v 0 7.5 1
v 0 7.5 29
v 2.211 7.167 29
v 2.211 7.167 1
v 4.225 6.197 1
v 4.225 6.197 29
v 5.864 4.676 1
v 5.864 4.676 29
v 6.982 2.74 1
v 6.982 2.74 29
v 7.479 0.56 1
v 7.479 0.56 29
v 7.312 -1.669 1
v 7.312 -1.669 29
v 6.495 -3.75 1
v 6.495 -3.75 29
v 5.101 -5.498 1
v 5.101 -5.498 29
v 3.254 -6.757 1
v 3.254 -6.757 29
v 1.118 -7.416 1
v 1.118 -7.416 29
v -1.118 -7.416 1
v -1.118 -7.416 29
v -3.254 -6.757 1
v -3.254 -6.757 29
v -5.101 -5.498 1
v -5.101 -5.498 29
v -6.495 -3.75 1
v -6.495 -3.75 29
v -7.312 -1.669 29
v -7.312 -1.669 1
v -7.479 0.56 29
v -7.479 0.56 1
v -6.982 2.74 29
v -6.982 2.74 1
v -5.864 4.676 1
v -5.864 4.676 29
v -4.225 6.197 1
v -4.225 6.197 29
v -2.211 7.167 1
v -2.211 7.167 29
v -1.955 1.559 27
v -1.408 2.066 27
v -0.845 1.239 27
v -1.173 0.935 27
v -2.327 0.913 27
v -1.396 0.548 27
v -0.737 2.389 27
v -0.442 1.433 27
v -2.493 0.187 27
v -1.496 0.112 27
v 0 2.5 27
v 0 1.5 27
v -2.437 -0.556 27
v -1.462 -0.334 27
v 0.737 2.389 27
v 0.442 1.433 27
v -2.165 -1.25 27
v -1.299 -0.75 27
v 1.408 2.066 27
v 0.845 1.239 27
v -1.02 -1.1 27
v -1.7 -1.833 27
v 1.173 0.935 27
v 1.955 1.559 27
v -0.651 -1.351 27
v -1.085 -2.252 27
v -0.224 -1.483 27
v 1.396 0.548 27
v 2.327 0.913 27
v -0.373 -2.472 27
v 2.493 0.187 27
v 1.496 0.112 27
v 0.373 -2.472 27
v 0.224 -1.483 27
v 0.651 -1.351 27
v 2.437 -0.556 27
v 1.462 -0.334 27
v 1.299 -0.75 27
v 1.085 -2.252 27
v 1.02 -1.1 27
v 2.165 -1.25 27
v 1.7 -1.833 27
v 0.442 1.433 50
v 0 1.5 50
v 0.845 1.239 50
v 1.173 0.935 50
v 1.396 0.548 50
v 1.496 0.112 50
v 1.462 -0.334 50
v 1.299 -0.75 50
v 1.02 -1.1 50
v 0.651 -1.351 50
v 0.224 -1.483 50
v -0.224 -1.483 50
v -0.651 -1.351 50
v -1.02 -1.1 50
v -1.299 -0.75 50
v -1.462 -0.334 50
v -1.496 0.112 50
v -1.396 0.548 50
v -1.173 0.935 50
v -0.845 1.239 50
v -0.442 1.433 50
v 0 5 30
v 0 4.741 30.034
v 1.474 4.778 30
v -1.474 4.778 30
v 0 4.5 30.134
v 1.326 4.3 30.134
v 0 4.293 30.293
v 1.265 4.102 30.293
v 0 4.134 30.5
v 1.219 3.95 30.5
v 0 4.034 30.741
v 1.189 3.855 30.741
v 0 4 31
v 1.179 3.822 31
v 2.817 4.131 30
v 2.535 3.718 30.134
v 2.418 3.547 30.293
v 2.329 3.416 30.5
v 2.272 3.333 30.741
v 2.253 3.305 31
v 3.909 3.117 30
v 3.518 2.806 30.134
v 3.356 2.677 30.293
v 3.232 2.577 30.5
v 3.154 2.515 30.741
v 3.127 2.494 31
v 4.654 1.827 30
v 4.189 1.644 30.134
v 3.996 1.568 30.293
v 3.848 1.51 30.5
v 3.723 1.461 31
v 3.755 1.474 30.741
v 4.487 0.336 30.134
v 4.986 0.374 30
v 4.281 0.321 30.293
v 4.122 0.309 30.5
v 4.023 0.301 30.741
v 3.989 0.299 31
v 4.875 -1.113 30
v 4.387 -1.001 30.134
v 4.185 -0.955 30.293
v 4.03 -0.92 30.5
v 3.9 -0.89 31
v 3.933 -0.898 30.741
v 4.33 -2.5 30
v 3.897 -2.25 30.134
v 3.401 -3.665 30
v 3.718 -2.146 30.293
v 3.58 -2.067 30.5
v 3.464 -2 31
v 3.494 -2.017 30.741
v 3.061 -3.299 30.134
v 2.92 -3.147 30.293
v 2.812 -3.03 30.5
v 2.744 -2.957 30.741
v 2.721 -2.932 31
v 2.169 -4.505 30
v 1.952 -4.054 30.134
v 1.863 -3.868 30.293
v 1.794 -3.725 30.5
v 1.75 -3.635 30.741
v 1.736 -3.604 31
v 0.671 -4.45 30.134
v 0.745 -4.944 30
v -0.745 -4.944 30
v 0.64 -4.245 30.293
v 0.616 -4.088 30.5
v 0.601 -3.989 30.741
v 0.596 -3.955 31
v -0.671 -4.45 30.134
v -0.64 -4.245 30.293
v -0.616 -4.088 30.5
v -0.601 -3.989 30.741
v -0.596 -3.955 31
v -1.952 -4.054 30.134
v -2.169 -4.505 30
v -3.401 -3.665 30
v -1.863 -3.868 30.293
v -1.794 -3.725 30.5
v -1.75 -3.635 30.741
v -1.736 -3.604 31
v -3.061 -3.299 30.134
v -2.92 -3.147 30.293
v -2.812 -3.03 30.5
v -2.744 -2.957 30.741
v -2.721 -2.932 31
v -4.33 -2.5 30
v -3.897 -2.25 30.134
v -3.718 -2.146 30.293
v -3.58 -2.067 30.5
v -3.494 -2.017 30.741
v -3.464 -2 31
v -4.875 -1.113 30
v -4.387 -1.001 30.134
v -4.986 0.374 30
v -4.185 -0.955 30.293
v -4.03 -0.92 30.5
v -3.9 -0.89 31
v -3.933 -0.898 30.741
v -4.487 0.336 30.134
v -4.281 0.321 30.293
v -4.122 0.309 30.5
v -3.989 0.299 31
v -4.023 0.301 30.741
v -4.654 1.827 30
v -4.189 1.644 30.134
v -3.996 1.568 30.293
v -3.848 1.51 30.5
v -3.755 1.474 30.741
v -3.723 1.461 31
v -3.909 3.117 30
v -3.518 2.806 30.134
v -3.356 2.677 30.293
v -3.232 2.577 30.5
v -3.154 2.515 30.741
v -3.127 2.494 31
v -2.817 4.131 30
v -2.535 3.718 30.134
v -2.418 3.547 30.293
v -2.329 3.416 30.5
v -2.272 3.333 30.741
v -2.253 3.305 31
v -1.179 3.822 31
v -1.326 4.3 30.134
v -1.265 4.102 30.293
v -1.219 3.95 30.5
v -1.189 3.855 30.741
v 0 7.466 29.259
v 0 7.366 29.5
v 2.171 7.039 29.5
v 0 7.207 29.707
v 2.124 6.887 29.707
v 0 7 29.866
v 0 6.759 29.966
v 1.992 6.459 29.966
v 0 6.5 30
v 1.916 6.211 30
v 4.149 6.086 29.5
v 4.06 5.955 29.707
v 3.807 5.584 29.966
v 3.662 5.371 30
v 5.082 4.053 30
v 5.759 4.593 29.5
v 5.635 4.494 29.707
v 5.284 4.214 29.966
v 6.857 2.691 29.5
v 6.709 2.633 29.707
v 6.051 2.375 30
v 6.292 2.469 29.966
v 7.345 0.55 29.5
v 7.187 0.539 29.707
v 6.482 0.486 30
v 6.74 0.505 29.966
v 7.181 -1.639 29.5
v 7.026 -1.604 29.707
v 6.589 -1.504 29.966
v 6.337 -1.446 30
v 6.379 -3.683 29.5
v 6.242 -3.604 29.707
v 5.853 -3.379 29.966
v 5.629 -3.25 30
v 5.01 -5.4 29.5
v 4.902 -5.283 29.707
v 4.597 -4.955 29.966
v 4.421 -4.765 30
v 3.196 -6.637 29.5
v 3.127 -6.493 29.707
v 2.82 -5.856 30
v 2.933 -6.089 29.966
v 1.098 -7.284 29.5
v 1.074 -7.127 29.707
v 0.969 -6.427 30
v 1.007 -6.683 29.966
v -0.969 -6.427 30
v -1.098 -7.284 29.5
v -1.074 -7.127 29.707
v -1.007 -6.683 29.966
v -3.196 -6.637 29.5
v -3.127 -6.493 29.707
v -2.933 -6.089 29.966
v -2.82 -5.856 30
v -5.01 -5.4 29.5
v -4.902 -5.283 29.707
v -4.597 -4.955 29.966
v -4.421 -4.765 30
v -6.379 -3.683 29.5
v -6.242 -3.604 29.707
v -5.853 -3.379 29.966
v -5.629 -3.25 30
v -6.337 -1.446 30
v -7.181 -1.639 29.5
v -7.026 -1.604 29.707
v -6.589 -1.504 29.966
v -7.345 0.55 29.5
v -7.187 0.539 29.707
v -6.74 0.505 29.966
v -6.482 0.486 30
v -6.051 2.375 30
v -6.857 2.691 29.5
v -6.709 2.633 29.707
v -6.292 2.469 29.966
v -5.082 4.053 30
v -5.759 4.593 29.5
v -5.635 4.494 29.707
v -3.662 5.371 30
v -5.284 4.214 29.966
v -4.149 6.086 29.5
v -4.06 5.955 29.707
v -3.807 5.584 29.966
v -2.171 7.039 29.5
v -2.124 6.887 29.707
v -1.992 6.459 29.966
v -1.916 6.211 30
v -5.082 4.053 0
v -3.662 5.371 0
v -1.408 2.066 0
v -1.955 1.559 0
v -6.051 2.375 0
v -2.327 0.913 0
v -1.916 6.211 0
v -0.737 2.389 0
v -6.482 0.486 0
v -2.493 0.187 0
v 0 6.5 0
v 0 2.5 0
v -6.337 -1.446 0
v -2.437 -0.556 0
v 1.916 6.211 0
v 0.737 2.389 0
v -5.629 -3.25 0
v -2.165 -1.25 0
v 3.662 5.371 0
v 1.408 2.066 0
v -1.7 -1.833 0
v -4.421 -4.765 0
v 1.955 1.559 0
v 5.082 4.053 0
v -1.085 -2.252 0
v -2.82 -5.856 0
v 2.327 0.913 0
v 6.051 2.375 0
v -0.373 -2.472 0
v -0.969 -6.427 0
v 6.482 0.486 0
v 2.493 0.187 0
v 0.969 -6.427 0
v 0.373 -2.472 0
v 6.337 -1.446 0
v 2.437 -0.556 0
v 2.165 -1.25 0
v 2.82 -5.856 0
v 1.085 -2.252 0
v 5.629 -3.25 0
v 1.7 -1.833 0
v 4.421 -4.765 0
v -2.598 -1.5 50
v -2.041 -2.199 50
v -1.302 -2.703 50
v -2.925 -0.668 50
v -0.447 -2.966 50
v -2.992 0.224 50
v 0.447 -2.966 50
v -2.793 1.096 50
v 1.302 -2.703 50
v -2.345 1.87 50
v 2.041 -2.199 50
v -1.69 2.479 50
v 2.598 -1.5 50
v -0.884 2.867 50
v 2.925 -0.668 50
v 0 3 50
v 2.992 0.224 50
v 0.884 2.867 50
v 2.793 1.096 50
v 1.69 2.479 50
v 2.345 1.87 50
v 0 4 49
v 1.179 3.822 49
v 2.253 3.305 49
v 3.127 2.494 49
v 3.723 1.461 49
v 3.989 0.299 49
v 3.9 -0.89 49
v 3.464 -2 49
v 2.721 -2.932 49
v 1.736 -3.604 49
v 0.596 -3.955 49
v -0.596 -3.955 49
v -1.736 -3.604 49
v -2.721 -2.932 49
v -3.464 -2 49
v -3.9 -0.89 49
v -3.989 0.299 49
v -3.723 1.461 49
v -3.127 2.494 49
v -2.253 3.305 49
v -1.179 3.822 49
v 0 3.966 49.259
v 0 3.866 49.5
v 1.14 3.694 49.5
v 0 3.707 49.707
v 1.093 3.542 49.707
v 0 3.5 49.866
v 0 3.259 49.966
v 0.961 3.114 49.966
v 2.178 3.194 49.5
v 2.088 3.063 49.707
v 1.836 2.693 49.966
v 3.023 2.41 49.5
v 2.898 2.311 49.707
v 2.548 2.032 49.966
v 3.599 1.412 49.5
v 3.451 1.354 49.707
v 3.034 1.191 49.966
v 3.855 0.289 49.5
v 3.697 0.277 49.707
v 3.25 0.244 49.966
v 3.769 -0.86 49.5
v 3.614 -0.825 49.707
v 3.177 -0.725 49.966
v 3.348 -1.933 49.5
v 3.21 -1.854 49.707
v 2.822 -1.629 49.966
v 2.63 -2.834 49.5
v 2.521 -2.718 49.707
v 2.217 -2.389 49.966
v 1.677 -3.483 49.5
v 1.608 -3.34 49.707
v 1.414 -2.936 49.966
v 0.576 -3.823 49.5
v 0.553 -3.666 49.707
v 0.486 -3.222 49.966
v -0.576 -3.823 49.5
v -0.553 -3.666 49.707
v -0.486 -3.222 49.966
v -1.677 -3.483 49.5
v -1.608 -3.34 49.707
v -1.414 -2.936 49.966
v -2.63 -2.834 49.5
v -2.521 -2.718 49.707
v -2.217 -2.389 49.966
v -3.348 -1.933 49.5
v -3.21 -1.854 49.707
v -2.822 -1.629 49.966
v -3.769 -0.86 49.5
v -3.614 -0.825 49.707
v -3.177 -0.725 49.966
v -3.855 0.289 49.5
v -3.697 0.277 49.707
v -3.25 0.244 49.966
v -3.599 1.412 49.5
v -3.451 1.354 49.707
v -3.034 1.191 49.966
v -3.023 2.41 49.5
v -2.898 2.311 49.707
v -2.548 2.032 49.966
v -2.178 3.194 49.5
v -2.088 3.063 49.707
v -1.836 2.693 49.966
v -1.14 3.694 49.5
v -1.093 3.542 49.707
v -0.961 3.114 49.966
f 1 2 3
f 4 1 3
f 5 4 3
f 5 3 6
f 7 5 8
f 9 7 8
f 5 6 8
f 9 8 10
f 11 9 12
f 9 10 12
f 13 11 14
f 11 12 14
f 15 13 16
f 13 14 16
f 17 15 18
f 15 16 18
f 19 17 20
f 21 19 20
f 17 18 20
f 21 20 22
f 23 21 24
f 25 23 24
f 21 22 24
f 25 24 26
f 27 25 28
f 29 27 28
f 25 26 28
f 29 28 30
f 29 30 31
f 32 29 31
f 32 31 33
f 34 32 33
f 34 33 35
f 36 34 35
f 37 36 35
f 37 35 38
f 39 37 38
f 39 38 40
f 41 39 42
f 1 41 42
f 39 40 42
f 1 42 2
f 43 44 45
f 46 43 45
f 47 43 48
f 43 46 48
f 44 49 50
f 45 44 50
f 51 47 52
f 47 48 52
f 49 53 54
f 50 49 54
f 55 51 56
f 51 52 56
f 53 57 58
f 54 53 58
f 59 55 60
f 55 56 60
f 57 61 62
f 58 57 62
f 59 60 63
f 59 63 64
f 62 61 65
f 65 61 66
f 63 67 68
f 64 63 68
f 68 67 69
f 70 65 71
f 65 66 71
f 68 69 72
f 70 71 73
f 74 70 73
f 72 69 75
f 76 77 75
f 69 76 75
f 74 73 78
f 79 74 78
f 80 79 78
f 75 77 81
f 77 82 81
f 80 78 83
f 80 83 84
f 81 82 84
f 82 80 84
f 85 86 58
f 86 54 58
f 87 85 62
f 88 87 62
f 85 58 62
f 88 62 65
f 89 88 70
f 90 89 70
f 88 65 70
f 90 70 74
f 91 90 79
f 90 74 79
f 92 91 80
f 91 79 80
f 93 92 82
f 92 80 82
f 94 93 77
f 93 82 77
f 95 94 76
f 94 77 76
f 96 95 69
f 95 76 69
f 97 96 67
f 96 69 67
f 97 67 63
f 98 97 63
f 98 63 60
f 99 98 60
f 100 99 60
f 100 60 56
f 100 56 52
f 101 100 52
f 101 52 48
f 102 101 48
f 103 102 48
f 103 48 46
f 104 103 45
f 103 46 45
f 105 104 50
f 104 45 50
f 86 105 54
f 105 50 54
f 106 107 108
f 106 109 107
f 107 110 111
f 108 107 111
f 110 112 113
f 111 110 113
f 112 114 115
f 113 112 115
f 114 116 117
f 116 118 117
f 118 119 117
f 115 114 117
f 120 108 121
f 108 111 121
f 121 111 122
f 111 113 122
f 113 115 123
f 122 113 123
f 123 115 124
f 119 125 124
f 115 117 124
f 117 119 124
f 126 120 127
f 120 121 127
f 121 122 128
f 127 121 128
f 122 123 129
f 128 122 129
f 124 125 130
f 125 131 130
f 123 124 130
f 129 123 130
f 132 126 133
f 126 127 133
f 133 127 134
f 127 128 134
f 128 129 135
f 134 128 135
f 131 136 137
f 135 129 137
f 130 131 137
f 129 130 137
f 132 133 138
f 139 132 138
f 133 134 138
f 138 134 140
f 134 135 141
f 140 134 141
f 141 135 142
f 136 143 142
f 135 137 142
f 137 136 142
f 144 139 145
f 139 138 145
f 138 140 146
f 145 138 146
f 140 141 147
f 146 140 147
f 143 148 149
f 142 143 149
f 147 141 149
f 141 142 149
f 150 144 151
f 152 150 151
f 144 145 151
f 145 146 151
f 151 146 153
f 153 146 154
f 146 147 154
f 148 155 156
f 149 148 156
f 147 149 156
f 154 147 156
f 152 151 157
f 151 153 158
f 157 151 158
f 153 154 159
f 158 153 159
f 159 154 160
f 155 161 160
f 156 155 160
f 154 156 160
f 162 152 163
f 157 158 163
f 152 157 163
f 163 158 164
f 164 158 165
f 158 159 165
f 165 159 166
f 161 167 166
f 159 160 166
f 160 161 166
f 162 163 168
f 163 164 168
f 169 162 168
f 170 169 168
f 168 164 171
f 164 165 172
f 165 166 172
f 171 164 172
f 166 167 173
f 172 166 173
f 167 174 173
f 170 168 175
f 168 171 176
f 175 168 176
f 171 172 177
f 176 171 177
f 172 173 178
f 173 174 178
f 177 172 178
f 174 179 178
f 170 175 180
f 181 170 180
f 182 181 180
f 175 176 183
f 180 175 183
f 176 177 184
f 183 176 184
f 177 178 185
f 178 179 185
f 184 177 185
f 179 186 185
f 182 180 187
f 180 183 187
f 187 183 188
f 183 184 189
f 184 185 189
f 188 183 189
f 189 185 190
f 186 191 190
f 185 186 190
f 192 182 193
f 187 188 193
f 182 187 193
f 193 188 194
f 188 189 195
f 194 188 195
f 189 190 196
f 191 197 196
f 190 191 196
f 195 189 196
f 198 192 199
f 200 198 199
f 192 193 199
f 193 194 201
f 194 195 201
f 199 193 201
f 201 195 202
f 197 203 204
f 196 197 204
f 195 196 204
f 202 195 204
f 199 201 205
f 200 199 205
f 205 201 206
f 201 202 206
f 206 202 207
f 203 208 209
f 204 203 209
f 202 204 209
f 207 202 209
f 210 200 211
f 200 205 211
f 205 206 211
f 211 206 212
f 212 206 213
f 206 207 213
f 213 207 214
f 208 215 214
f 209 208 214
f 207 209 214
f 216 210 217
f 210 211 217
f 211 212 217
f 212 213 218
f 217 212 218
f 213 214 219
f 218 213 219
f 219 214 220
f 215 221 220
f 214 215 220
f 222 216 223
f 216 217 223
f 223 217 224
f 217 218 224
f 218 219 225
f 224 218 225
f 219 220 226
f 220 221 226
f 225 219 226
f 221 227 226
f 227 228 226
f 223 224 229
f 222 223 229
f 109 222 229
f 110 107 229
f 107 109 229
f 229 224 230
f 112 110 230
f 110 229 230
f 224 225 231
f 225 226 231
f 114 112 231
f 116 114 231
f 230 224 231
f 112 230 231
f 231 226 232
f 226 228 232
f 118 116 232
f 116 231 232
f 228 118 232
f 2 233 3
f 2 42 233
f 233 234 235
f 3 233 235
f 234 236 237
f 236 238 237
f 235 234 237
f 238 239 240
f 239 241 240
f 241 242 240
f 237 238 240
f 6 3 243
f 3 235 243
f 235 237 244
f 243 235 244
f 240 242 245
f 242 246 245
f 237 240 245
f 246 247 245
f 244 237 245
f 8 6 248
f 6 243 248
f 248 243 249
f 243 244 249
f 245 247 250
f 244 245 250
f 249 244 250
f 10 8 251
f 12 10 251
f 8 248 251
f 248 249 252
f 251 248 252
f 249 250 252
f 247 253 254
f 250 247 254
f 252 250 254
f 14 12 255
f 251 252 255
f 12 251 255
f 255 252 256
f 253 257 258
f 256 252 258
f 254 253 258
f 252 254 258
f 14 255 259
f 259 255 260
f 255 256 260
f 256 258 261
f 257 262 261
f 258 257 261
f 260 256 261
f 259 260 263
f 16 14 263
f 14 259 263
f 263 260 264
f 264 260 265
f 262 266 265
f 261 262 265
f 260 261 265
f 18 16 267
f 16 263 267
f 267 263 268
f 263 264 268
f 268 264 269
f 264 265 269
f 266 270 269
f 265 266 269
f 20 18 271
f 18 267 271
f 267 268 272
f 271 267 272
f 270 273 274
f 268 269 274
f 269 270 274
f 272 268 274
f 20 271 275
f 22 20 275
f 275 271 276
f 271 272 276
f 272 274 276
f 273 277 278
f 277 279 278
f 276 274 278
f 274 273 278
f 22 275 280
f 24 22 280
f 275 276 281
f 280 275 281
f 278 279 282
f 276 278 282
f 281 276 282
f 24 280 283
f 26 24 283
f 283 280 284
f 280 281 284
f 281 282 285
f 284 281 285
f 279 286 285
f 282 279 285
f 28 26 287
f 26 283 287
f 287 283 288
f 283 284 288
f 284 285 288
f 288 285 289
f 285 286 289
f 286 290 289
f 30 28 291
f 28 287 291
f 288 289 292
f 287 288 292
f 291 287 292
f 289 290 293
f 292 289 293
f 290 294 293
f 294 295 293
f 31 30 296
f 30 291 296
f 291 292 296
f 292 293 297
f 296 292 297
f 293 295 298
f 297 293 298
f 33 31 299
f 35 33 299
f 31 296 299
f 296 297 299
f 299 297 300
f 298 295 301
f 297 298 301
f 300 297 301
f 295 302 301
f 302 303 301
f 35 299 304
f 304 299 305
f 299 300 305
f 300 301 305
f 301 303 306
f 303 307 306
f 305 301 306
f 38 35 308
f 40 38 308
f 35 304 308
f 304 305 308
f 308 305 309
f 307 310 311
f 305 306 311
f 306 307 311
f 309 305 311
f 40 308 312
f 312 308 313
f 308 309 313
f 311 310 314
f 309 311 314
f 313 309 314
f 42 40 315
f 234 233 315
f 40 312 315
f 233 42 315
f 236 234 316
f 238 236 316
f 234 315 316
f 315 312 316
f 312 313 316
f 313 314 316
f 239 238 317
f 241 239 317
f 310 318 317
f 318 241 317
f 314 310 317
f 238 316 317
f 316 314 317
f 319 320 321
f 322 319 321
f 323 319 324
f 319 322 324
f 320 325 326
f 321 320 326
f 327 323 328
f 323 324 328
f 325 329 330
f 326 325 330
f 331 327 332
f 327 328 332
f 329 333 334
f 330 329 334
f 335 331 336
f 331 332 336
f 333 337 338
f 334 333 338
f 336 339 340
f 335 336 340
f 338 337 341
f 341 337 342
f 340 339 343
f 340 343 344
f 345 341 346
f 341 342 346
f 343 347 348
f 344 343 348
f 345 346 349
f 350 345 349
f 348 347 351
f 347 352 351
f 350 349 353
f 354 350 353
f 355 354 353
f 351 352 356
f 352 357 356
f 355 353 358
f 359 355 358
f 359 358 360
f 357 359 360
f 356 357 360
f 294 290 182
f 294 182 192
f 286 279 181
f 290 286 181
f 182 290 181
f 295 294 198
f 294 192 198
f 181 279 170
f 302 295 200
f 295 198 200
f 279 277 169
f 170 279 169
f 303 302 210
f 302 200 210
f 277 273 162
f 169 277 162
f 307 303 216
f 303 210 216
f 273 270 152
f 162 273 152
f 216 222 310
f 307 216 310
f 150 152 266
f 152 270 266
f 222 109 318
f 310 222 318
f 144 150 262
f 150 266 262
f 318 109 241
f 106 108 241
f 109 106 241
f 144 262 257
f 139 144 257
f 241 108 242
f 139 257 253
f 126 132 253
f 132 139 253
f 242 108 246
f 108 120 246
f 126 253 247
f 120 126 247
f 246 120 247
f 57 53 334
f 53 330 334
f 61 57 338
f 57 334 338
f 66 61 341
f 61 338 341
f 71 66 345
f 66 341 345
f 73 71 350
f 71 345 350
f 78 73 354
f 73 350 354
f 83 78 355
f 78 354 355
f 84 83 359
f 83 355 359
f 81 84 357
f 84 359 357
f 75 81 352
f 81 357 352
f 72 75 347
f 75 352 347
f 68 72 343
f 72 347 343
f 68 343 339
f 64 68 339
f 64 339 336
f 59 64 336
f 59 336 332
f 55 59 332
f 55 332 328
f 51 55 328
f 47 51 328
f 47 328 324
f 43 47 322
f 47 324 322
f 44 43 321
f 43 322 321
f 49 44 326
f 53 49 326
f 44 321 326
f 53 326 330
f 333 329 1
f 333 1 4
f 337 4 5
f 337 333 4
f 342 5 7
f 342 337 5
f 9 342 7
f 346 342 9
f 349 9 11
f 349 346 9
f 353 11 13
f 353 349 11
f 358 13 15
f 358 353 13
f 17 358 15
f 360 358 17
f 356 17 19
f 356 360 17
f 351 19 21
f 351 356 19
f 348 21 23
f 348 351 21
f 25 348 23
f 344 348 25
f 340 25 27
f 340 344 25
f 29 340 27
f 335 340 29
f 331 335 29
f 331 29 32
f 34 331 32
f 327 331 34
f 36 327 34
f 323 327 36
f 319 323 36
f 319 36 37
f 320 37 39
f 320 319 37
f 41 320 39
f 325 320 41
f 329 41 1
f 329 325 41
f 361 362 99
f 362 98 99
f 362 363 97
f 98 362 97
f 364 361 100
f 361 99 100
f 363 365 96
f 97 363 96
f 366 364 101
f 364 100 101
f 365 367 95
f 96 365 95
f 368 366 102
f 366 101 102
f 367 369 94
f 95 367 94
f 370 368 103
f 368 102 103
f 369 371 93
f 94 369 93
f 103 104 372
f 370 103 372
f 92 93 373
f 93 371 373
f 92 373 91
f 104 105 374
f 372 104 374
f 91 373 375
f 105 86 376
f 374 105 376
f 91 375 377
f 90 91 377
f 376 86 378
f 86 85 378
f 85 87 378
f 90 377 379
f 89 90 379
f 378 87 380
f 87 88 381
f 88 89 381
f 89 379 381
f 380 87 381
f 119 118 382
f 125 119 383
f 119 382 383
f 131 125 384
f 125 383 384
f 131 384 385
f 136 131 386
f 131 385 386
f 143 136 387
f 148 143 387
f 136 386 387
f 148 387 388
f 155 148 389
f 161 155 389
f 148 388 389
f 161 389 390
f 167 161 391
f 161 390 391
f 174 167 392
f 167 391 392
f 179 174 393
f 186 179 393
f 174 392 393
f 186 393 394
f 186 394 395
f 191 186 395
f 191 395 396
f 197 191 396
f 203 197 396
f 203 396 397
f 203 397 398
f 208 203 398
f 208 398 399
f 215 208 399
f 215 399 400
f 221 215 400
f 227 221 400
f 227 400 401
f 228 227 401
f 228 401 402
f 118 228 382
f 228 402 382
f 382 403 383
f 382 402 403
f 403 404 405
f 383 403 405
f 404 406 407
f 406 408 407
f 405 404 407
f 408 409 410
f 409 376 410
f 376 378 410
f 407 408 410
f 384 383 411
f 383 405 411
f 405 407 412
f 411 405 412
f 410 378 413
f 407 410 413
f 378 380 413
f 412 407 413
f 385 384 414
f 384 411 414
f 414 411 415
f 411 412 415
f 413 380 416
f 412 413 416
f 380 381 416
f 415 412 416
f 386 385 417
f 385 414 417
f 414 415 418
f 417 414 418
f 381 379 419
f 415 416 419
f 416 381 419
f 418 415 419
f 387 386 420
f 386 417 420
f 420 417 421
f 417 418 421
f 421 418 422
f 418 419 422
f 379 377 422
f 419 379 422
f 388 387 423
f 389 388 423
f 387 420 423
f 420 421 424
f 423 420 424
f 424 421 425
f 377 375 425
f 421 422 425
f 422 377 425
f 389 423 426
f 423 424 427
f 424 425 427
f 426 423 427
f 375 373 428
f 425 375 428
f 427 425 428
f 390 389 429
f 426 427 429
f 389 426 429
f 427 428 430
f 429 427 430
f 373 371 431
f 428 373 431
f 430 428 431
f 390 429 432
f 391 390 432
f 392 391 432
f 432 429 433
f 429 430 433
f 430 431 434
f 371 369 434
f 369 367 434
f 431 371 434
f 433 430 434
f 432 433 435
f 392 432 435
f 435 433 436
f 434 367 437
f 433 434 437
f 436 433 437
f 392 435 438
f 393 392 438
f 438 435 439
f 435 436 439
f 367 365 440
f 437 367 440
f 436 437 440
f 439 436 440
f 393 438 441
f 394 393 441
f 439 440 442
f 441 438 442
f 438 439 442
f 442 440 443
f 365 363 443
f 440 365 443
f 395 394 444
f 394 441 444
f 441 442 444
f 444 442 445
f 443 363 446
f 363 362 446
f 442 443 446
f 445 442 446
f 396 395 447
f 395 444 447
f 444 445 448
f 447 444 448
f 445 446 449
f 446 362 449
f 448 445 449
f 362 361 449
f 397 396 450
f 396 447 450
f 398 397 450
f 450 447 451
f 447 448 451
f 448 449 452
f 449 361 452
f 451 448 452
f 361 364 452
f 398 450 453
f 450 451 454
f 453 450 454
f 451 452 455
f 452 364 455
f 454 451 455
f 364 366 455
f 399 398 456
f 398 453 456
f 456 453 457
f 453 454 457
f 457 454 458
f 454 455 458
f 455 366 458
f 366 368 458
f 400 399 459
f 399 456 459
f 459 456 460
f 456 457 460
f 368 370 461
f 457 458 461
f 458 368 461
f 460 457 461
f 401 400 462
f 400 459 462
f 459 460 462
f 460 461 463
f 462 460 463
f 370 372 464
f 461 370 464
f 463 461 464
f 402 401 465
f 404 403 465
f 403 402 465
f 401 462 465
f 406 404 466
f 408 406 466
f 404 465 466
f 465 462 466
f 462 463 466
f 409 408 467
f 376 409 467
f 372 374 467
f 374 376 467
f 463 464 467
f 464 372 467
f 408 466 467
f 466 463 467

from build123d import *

# Parameters (mm, degrees)
F2_R    = 1
F3_SIZE = 1


with BuildPart() as f1:
    # F0 (on Right) → F1 (revolve)
    with BuildSketch(Plane.YZ):
        Polygon((2.5, 27), (2.5, 0), (7.5, 0), (7.5, 30), (4, 30), (4, 50), (1.5, 50), (1.5, 27), align=None)
    revolve(axis=Axis((0, 0, 12.798217), (0, 0, -1)))

    # F2
    f2_edges = [f1.edges().sort_by_distance(p)[0] for p in [
        (0, -4, 50),
        (0, -4, 30),
        (0, -7.5, 30),
    ]]
    fillet(f2_edges, radius=F2_R)

    # F3
    f3_edges = [f1.edges().sort_by_distance(p)[0] for p in [
        (0, -7.5, 0),
    ]]
    chamfer(f3_edges, length=F3_SIZE)


solid = f1.part
